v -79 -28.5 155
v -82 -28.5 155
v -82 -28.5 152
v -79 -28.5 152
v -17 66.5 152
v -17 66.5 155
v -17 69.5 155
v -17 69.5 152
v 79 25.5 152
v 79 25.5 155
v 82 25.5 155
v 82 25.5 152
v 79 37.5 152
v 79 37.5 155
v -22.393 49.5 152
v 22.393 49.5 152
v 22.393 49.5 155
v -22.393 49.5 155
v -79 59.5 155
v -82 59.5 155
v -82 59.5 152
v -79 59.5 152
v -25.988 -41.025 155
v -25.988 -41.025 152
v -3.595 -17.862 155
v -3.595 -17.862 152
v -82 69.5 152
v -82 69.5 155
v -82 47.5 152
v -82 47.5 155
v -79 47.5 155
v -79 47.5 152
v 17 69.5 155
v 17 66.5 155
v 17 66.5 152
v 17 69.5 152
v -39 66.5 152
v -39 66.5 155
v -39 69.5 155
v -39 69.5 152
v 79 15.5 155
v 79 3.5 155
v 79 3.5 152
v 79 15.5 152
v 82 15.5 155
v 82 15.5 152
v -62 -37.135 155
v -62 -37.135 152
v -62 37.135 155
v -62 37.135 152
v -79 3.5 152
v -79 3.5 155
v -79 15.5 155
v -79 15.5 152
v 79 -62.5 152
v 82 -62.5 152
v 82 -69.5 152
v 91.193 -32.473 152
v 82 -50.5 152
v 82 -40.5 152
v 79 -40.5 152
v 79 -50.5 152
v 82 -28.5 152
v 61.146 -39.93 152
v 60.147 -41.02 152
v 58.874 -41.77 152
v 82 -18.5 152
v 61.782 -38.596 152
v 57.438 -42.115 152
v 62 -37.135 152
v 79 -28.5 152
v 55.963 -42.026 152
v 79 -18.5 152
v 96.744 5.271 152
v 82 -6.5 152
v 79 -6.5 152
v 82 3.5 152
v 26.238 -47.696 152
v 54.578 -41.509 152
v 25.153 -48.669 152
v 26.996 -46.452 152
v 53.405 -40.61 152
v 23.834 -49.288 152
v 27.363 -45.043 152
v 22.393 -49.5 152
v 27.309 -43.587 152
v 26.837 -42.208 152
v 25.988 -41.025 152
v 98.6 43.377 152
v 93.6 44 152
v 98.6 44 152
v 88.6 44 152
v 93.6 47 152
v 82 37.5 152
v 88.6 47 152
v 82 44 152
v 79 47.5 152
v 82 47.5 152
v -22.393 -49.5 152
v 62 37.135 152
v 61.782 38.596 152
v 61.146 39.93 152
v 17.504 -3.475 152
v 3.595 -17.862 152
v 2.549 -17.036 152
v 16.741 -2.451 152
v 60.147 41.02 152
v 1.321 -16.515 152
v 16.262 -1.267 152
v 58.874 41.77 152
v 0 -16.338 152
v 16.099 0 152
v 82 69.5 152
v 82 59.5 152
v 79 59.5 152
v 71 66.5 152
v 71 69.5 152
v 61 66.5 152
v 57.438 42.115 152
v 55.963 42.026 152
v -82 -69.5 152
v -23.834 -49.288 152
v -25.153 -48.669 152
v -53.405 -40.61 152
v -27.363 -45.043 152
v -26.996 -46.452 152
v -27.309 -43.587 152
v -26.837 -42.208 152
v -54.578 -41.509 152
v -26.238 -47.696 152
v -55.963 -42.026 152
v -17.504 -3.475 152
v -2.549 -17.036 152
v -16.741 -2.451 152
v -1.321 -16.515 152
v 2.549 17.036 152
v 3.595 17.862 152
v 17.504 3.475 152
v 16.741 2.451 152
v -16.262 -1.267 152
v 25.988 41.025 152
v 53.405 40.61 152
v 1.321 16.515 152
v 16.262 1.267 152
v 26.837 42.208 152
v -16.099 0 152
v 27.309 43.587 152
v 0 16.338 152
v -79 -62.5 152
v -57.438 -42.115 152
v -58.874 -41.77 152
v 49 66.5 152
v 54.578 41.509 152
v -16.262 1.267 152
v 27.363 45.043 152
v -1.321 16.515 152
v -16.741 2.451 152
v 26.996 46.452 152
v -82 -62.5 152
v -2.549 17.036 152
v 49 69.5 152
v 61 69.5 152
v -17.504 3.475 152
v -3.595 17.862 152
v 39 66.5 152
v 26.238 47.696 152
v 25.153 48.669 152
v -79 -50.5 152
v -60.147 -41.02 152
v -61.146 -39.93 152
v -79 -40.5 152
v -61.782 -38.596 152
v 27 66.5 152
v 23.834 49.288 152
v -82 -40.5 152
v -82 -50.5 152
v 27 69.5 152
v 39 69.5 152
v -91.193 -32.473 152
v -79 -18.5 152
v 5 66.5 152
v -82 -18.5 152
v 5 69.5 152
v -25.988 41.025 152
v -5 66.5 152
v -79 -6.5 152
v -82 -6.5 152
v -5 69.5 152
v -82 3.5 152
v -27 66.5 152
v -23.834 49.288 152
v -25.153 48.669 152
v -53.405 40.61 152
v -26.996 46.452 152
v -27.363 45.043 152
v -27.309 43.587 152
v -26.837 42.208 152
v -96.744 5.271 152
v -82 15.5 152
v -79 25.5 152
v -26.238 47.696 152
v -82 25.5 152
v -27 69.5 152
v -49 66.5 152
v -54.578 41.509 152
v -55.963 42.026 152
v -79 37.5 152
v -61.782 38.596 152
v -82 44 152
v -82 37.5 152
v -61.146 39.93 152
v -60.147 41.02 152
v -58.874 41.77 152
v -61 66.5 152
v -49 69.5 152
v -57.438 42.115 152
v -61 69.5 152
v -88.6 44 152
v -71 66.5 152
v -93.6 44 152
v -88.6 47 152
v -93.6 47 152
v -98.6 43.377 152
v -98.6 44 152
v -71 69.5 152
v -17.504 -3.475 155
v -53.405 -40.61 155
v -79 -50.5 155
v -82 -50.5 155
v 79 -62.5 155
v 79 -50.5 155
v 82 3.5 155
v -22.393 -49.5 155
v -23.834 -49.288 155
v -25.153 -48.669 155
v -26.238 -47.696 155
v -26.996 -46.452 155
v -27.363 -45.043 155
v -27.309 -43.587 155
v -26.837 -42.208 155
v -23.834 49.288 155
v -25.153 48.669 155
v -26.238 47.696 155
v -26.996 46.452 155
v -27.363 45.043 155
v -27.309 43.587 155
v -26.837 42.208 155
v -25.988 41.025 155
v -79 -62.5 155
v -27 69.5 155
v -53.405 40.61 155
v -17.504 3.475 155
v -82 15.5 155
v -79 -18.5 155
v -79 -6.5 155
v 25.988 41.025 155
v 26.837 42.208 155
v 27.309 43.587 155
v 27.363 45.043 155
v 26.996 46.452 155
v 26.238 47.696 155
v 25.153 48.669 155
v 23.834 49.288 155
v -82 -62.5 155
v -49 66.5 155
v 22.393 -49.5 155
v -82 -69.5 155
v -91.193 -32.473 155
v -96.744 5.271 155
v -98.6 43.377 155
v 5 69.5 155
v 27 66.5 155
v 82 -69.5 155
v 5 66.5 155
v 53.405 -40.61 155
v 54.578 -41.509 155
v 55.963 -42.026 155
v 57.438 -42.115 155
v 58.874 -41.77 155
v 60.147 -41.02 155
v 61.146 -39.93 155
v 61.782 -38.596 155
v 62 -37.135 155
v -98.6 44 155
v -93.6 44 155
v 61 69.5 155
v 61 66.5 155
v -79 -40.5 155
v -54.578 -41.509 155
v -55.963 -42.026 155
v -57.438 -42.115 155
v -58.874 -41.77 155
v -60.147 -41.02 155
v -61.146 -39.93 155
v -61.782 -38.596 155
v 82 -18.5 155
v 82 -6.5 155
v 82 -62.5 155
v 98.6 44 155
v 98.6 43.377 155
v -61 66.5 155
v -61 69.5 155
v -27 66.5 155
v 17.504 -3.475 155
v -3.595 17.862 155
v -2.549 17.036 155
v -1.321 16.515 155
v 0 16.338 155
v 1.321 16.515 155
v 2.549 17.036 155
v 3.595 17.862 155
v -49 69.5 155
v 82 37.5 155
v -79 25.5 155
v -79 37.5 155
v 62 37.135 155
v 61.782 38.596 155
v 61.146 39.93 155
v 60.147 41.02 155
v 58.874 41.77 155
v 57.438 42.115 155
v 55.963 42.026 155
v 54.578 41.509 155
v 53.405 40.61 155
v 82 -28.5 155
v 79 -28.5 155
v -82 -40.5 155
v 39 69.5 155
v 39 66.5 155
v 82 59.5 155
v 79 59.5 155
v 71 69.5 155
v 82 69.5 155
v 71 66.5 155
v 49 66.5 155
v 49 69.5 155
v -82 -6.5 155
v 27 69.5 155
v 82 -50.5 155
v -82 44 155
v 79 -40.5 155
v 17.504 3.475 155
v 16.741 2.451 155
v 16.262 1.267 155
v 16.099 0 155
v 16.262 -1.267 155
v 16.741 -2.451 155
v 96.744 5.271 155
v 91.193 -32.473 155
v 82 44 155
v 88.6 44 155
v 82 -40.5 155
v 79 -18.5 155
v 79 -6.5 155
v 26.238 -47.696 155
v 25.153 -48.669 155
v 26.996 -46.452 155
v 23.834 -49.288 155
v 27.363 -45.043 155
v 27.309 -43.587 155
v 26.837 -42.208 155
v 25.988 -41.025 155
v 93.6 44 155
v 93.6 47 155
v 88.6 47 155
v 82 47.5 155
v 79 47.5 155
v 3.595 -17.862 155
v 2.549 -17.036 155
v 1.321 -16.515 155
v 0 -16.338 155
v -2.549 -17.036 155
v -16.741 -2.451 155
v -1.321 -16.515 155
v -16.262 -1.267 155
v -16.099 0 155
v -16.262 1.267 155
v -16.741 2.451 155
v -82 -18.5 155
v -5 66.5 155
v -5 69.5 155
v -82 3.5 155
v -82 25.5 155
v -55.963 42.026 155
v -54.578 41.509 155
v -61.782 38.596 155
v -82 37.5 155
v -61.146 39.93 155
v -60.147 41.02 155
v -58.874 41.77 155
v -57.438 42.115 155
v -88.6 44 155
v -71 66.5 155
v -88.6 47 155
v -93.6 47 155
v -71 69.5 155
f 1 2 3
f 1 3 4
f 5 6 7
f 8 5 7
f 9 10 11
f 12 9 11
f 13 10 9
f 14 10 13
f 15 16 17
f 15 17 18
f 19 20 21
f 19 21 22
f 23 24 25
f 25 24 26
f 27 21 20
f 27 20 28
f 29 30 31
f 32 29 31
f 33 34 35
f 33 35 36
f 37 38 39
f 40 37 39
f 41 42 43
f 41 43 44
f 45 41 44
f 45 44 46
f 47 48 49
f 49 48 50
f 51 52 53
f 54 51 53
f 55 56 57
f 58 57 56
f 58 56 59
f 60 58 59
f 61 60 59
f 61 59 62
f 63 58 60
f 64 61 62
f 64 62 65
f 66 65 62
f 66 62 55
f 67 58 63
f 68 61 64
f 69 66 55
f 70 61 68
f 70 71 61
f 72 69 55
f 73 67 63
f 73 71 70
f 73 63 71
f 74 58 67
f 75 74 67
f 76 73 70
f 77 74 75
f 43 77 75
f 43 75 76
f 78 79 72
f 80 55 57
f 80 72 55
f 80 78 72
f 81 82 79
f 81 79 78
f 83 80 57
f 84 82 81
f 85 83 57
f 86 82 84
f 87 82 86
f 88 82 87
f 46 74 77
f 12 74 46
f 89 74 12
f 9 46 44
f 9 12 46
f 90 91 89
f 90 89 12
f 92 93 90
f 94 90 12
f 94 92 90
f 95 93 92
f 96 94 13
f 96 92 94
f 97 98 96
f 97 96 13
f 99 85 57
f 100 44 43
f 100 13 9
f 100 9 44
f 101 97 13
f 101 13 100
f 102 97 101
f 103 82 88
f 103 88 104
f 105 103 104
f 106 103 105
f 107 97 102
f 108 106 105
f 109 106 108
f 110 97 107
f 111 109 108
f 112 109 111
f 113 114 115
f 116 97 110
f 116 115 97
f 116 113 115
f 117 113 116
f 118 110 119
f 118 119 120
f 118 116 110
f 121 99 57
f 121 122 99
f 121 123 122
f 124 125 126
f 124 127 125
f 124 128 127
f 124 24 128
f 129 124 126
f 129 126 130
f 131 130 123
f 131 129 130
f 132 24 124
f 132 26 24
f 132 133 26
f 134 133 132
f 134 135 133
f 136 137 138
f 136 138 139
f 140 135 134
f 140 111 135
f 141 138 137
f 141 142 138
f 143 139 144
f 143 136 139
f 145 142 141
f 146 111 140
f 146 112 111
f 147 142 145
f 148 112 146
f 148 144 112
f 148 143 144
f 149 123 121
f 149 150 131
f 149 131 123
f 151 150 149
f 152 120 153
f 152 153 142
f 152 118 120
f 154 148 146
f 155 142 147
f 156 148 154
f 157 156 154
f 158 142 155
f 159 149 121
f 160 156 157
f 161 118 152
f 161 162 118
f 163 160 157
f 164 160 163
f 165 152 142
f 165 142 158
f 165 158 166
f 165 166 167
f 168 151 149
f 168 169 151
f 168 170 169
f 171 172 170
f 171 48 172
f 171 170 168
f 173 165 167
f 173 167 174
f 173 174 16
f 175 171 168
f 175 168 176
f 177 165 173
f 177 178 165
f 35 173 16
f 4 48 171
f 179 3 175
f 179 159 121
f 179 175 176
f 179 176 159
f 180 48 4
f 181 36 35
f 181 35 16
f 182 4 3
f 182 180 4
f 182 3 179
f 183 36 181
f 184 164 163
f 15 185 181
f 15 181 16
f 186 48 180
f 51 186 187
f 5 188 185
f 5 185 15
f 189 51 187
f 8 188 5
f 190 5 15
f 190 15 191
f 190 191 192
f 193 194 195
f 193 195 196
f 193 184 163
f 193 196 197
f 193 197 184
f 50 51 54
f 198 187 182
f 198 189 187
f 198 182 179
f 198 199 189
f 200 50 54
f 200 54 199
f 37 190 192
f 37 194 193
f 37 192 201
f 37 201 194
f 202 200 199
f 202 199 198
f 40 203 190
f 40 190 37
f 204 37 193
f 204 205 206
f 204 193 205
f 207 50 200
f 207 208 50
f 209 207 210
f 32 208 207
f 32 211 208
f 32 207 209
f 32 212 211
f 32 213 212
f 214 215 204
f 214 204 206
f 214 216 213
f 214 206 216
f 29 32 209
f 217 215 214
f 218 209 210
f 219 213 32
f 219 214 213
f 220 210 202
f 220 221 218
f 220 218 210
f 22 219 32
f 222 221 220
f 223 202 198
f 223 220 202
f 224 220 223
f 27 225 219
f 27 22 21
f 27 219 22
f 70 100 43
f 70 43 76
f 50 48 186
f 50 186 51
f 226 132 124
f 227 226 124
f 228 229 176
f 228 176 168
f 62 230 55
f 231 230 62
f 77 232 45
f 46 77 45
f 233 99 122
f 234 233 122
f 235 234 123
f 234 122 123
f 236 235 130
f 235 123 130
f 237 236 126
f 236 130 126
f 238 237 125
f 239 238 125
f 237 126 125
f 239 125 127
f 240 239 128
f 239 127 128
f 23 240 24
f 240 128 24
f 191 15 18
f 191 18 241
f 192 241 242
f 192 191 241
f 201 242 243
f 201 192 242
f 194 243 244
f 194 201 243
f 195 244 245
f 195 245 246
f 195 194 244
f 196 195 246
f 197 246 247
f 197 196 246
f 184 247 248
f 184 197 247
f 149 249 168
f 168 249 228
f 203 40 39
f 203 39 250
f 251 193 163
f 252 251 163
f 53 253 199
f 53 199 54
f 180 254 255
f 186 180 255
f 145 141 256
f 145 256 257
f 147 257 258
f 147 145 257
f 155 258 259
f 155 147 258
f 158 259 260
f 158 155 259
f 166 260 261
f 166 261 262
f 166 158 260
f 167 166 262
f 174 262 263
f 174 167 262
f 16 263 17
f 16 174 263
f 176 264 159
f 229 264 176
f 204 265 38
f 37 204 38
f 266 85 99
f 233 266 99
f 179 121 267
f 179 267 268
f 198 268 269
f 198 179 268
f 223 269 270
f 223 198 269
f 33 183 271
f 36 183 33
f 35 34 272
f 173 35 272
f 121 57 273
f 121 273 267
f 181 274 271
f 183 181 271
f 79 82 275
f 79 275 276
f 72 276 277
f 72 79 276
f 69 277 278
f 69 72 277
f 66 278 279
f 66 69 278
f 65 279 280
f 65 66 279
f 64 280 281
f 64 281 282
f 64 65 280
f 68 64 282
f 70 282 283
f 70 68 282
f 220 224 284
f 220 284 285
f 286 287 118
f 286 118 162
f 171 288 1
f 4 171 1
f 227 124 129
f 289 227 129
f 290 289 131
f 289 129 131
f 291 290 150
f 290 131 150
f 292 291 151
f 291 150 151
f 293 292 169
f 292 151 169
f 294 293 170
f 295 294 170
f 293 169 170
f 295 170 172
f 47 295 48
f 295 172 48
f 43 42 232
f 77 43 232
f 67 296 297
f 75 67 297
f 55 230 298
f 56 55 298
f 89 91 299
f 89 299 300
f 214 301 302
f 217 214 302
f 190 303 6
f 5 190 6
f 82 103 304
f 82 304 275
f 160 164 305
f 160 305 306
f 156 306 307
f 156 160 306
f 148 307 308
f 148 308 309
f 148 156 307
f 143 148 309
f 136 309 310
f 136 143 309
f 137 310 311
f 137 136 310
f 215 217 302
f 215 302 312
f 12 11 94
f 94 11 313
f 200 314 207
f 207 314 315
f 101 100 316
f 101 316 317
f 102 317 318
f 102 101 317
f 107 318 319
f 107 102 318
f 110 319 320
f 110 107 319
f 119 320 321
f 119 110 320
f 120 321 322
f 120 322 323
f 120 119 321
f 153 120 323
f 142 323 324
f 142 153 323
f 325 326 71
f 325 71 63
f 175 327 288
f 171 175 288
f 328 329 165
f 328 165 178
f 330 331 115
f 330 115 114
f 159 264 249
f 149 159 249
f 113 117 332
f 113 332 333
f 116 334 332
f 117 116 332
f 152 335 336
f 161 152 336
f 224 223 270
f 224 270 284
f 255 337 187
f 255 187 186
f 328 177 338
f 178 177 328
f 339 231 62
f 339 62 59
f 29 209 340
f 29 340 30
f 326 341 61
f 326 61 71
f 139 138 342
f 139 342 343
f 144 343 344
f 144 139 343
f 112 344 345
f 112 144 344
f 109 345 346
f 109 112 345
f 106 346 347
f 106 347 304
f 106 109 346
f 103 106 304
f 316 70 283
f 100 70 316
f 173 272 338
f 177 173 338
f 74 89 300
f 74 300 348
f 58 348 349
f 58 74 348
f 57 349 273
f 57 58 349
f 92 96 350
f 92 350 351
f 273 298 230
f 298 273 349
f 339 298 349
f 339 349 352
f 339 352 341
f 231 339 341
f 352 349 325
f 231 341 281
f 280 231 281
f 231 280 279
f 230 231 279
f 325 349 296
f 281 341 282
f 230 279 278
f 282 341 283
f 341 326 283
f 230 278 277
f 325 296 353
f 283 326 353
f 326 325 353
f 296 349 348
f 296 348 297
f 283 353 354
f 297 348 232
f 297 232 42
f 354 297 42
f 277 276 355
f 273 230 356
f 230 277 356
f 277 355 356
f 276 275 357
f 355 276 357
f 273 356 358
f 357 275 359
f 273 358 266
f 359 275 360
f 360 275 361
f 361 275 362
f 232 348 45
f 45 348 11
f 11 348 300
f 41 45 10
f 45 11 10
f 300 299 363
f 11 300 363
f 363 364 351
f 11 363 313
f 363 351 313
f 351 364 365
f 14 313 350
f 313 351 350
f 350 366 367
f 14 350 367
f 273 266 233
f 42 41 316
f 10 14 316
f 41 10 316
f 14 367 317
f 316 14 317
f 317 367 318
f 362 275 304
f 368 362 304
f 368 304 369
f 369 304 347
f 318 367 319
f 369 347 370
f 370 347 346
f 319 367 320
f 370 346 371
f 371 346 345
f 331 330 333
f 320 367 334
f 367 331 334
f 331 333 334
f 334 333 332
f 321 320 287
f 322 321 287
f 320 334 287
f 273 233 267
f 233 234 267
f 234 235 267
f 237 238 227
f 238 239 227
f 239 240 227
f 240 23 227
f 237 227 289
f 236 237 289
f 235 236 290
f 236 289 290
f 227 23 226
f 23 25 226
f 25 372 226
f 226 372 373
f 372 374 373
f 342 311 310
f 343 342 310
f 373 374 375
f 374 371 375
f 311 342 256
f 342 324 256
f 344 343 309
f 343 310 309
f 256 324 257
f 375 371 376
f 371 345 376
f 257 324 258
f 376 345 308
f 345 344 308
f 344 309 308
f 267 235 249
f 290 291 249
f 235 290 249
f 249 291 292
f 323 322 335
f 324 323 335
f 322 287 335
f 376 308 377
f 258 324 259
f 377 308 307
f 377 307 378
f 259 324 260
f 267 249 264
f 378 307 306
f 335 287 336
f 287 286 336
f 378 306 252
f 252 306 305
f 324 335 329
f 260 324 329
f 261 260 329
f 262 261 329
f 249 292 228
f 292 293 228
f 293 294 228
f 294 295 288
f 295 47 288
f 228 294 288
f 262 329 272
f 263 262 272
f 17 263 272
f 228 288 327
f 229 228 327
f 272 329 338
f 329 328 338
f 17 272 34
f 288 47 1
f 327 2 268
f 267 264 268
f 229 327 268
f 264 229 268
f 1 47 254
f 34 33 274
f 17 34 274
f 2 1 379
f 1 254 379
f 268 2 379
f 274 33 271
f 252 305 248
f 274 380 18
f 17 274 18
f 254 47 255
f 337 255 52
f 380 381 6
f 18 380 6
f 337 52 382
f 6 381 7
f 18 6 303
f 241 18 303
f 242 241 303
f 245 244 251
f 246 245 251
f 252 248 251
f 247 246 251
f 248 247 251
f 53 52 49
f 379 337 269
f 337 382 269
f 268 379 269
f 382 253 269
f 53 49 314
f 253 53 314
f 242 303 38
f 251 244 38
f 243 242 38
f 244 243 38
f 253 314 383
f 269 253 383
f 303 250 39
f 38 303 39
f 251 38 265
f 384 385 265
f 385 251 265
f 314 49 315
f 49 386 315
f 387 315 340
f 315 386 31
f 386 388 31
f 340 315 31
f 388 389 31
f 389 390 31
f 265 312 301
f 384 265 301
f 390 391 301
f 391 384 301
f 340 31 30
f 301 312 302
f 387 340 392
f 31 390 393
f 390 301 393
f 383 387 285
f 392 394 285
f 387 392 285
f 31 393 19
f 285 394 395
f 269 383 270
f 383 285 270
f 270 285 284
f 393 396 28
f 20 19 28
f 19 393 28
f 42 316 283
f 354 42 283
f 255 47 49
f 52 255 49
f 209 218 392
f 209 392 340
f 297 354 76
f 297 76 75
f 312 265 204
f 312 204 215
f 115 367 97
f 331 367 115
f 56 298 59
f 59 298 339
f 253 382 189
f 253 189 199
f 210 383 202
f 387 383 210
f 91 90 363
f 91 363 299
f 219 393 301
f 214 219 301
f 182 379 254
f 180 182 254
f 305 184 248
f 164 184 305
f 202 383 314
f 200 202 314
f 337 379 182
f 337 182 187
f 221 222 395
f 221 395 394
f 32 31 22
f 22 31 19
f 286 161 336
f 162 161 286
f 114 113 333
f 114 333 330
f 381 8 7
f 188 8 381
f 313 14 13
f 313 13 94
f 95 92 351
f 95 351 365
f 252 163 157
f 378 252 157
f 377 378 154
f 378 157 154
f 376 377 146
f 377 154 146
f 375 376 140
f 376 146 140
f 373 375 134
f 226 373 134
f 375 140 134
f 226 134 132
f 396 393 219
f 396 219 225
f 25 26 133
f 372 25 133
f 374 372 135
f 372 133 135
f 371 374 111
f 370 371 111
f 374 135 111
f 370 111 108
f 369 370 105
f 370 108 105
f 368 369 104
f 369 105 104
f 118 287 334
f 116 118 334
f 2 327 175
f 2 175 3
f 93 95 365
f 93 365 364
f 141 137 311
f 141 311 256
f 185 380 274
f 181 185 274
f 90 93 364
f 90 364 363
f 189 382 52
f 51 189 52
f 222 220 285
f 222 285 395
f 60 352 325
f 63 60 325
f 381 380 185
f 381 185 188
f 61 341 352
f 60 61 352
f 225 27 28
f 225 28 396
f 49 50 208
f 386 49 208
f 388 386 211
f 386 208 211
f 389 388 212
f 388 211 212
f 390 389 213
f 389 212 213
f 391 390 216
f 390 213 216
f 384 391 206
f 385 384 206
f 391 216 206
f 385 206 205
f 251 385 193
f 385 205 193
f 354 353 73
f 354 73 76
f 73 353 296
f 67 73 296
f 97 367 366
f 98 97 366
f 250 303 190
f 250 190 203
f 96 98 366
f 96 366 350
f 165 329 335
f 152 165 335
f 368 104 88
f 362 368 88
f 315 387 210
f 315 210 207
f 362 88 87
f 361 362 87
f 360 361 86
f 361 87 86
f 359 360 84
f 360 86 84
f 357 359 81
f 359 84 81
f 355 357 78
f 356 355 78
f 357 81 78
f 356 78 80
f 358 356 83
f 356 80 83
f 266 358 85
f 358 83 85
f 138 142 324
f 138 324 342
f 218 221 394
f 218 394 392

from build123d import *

# Parameters (mm, degrees)
BOSS_EXTRUDE1_DEPTH = 3
SKETCH2_W           = 10
SKETCH2_H           = 3
SKETCH2_W_2         = 3
SKETCH2_H_2         = 12
CUT_EXTRUDE1_DEPTH  = 10


with BuildPart() as part:
    # Sketch1 → Boss-Extrude1 (new body)
    with BuildSketch(Plane.XY.offset(152)):
        with BuildLine():
            Line((-82, 69.5), (82, 69.5))
            Line((82, 69.5), (82, 44))
            Line((82, 44), (88.6, 44))
            Line((88.6, 44), (88.6, 47))
            Line((88.6, 47), (93.6, 47))
            Line((93.6, 47), (93.6, 44))
            Line((93.6, 44), (98.6, 44))
            Line((98.6, 44), (98.6, 43.377104502))
            ThreePointArc((98.6, 43.377104502), (94.427800977, -13.668492876), (82, -69.5))
            Line((82, -69.5), (-82, -69.5))
            ThreePointArc((-82, -69.5), (-94.427800977, -13.668492876), (-98.6, 43.377104502))
            Line((-98.6, 43.377104502), (-98.6, 44))
            Line((-98.6, 44), (-93.6, 44))
            Line((-93.6, 44), (-93.6, 47))
            Line((-93.6, 47), (-88.6, 47))
            Line((-88.6, 47), (-88.6, 44))
            Line((-88.6, 44), (-82, 44))
            Line((-82, 44), (-82, 69.5))
        make_face()
        with BuildLine():
            Line((-62, -37.134656801), (-62, 37.134656801))
            ThreePointArc((-62, 37.134656801), (-58.87434678, 41.770045043), (-53.405270341, 40.609986811))
            Line((-53.405270341, 40.609986811), (-17.504048439, 3.47533001))
            ThreePointArc((-17.504048439, 3.47533001), (-16.098778099, 0), (-17.504048439, -3.47533001))
            Line((-17.504048439, -3.47533001), (-53.405270341, -40.609986811))
            ThreePointArc((-53.405270341, -40.609986811), (-58.87434678, -41.770045043), (-62, -37.134656801))
        make_face(mode=Mode.SUBTRACT)
        with BuildLine():
            Line((22.39294647, 49.5), (-22.39294647, 49.5))
            ThreePointArc((-22.39294647, 49.5), (-26.996024247, 46.452351141), (-25.987676129, 41.02466999))
            Line((-25.987676129, 41.02466999), (-3.594729659, 17.862383642))
            ThreePointArc((-3.594729659, 17.862383642), (0, 16.337713652), (3.594729659, 17.862383642))
            Line((3.594729659, 17.862383642), (25.987676129, 41.02466999))
            ThreePointArc((25.987676129, 41.02466999), (26.996024247, 46.452351141), (22.39294647, 49.5))
        make_face(mode=Mode.SUBTRACT)
        with BuildLine():
            Line((53.405270341, 40.609986811), (17.504048439, 3.47533001))
            ThreePointArc((17.504048439, 3.47533001), (16.098778099, 0), (17.504048439, -3.47533001))
            Line((17.504048439, -3.47533001), (53.405270341, -40.609986811))
            ThreePointArc((53.405270341, -40.609986811), (58.87434678, -41.770045043), (62, -37.134656801))
            Line((62, -37.134656801), (62, 37.134656801))
            ThreePointArc((62, 37.134656801), (58.87434678, 41.770045043), (53.405270341, 40.609986811))
        make_face(mode=Mode.SUBTRACT)
        with BuildLine():
            Line((-25.987676129, -41.02466999), (-3.594729659, -17.862383642))
            ThreePointArc((-3.594729659, -17.862383642), (0, -16.337713652), (3.594729659, -17.862383642))
            Line((3.594729659, -17.862383642), (25.987676129, -41.02466999))
            ThreePointArc((25.987676129, -41.02466999), (26.996024247, -46.452351141), (22.39294647, -49.5))
            Line((22.39294647, -49.5), (-22.39294647, -49.5))
            ThreePointArc((-22.39294647, -49.5), (-26.996024247, -46.452351141), (-25.987676129, -41.02466999))
        make_face(mode=Mode.SUBTRACT)
    extrude(amount=BOSS_EXTRUDE1_DEPTH)

    # Sketch2 → Cut-Extrude1 (cut)
    with BuildSketch(Plane.XY.offset(155)):
        with Locations((0, 68)):
            Rectangle(SKETCH2_W, SKETCH2_H)
        with Locations((-22, 68)):
            Rectangle(SKETCH2_W, SKETCH2_H)
        with Locations((22, 68)):
            Rectangle(SKETCH2_W, SKETCH2_H)
        with Locations((-44, 68)):
            Rectangle(SKETCH2_W, SKETCH2_H)
        with Locations((44, 68)):
            Rectangle(SKETCH2_W, SKETCH2_H)
        with Locations((-66, 68)):
            Rectangle(SKETCH2_W, SKETCH2_H)
        with Locations((66, 68)):
            Rectangle(SKETCH2_W, SKETCH2_H)
        with Locations((-80.5, 53.5)):
            Rectangle(SKETCH2_W_2, SKETCH2_H_2)
        with Locations((80.5, 53.5)):
            Rectangle(SKETCH2_W_2, SKETCH2_H_2)
        with Locations((-80.5, 31.5)):
            Rectangle(SKETCH2_W_2, SKETCH2_H_2)
        with Locations((-80.5, 9.5)):
            Rectangle(SKETCH2_W_2, SKETCH2_H_2)
        with Locations((-80.5, -12.5)):
            Rectangle(SKETCH2_W_2, SKETCH2_H_2)
        with Locations((-80.5, -34.5)):
            Rectangle(SKETCH2_W_2, SKETCH2_H_2)
        with Locations((-80.5, -56.5)):
            Rectangle(SKETCH2_W_2, SKETCH2_H_2)
        with Locations((80.5, -56.5)):
            Rectangle(SKETCH2_W_2, SKETCH2_H_2)
        with Locations((80.5, -34.5)):
            Rectangle(SKETCH2_W_2, SKETCH2_H_2)
        with Locations((80.5, -12.5)):
            Rectangle(SKETCH2_W_2, SKETCH2_H_2)
        with Locations((80.5, 9.5)):
            Rectangle(SKETCH2_W_2, SKETCH2_H_2)
        with Locations((80.5, 31.5)):
            Rectangle(SKETCH2_W_2, SKETCH2_H_2)
    extrude(amount=-CUT_EXTRUDE1_DEPTH, mode=Mode.SUBTRACT)


solid = part.part
